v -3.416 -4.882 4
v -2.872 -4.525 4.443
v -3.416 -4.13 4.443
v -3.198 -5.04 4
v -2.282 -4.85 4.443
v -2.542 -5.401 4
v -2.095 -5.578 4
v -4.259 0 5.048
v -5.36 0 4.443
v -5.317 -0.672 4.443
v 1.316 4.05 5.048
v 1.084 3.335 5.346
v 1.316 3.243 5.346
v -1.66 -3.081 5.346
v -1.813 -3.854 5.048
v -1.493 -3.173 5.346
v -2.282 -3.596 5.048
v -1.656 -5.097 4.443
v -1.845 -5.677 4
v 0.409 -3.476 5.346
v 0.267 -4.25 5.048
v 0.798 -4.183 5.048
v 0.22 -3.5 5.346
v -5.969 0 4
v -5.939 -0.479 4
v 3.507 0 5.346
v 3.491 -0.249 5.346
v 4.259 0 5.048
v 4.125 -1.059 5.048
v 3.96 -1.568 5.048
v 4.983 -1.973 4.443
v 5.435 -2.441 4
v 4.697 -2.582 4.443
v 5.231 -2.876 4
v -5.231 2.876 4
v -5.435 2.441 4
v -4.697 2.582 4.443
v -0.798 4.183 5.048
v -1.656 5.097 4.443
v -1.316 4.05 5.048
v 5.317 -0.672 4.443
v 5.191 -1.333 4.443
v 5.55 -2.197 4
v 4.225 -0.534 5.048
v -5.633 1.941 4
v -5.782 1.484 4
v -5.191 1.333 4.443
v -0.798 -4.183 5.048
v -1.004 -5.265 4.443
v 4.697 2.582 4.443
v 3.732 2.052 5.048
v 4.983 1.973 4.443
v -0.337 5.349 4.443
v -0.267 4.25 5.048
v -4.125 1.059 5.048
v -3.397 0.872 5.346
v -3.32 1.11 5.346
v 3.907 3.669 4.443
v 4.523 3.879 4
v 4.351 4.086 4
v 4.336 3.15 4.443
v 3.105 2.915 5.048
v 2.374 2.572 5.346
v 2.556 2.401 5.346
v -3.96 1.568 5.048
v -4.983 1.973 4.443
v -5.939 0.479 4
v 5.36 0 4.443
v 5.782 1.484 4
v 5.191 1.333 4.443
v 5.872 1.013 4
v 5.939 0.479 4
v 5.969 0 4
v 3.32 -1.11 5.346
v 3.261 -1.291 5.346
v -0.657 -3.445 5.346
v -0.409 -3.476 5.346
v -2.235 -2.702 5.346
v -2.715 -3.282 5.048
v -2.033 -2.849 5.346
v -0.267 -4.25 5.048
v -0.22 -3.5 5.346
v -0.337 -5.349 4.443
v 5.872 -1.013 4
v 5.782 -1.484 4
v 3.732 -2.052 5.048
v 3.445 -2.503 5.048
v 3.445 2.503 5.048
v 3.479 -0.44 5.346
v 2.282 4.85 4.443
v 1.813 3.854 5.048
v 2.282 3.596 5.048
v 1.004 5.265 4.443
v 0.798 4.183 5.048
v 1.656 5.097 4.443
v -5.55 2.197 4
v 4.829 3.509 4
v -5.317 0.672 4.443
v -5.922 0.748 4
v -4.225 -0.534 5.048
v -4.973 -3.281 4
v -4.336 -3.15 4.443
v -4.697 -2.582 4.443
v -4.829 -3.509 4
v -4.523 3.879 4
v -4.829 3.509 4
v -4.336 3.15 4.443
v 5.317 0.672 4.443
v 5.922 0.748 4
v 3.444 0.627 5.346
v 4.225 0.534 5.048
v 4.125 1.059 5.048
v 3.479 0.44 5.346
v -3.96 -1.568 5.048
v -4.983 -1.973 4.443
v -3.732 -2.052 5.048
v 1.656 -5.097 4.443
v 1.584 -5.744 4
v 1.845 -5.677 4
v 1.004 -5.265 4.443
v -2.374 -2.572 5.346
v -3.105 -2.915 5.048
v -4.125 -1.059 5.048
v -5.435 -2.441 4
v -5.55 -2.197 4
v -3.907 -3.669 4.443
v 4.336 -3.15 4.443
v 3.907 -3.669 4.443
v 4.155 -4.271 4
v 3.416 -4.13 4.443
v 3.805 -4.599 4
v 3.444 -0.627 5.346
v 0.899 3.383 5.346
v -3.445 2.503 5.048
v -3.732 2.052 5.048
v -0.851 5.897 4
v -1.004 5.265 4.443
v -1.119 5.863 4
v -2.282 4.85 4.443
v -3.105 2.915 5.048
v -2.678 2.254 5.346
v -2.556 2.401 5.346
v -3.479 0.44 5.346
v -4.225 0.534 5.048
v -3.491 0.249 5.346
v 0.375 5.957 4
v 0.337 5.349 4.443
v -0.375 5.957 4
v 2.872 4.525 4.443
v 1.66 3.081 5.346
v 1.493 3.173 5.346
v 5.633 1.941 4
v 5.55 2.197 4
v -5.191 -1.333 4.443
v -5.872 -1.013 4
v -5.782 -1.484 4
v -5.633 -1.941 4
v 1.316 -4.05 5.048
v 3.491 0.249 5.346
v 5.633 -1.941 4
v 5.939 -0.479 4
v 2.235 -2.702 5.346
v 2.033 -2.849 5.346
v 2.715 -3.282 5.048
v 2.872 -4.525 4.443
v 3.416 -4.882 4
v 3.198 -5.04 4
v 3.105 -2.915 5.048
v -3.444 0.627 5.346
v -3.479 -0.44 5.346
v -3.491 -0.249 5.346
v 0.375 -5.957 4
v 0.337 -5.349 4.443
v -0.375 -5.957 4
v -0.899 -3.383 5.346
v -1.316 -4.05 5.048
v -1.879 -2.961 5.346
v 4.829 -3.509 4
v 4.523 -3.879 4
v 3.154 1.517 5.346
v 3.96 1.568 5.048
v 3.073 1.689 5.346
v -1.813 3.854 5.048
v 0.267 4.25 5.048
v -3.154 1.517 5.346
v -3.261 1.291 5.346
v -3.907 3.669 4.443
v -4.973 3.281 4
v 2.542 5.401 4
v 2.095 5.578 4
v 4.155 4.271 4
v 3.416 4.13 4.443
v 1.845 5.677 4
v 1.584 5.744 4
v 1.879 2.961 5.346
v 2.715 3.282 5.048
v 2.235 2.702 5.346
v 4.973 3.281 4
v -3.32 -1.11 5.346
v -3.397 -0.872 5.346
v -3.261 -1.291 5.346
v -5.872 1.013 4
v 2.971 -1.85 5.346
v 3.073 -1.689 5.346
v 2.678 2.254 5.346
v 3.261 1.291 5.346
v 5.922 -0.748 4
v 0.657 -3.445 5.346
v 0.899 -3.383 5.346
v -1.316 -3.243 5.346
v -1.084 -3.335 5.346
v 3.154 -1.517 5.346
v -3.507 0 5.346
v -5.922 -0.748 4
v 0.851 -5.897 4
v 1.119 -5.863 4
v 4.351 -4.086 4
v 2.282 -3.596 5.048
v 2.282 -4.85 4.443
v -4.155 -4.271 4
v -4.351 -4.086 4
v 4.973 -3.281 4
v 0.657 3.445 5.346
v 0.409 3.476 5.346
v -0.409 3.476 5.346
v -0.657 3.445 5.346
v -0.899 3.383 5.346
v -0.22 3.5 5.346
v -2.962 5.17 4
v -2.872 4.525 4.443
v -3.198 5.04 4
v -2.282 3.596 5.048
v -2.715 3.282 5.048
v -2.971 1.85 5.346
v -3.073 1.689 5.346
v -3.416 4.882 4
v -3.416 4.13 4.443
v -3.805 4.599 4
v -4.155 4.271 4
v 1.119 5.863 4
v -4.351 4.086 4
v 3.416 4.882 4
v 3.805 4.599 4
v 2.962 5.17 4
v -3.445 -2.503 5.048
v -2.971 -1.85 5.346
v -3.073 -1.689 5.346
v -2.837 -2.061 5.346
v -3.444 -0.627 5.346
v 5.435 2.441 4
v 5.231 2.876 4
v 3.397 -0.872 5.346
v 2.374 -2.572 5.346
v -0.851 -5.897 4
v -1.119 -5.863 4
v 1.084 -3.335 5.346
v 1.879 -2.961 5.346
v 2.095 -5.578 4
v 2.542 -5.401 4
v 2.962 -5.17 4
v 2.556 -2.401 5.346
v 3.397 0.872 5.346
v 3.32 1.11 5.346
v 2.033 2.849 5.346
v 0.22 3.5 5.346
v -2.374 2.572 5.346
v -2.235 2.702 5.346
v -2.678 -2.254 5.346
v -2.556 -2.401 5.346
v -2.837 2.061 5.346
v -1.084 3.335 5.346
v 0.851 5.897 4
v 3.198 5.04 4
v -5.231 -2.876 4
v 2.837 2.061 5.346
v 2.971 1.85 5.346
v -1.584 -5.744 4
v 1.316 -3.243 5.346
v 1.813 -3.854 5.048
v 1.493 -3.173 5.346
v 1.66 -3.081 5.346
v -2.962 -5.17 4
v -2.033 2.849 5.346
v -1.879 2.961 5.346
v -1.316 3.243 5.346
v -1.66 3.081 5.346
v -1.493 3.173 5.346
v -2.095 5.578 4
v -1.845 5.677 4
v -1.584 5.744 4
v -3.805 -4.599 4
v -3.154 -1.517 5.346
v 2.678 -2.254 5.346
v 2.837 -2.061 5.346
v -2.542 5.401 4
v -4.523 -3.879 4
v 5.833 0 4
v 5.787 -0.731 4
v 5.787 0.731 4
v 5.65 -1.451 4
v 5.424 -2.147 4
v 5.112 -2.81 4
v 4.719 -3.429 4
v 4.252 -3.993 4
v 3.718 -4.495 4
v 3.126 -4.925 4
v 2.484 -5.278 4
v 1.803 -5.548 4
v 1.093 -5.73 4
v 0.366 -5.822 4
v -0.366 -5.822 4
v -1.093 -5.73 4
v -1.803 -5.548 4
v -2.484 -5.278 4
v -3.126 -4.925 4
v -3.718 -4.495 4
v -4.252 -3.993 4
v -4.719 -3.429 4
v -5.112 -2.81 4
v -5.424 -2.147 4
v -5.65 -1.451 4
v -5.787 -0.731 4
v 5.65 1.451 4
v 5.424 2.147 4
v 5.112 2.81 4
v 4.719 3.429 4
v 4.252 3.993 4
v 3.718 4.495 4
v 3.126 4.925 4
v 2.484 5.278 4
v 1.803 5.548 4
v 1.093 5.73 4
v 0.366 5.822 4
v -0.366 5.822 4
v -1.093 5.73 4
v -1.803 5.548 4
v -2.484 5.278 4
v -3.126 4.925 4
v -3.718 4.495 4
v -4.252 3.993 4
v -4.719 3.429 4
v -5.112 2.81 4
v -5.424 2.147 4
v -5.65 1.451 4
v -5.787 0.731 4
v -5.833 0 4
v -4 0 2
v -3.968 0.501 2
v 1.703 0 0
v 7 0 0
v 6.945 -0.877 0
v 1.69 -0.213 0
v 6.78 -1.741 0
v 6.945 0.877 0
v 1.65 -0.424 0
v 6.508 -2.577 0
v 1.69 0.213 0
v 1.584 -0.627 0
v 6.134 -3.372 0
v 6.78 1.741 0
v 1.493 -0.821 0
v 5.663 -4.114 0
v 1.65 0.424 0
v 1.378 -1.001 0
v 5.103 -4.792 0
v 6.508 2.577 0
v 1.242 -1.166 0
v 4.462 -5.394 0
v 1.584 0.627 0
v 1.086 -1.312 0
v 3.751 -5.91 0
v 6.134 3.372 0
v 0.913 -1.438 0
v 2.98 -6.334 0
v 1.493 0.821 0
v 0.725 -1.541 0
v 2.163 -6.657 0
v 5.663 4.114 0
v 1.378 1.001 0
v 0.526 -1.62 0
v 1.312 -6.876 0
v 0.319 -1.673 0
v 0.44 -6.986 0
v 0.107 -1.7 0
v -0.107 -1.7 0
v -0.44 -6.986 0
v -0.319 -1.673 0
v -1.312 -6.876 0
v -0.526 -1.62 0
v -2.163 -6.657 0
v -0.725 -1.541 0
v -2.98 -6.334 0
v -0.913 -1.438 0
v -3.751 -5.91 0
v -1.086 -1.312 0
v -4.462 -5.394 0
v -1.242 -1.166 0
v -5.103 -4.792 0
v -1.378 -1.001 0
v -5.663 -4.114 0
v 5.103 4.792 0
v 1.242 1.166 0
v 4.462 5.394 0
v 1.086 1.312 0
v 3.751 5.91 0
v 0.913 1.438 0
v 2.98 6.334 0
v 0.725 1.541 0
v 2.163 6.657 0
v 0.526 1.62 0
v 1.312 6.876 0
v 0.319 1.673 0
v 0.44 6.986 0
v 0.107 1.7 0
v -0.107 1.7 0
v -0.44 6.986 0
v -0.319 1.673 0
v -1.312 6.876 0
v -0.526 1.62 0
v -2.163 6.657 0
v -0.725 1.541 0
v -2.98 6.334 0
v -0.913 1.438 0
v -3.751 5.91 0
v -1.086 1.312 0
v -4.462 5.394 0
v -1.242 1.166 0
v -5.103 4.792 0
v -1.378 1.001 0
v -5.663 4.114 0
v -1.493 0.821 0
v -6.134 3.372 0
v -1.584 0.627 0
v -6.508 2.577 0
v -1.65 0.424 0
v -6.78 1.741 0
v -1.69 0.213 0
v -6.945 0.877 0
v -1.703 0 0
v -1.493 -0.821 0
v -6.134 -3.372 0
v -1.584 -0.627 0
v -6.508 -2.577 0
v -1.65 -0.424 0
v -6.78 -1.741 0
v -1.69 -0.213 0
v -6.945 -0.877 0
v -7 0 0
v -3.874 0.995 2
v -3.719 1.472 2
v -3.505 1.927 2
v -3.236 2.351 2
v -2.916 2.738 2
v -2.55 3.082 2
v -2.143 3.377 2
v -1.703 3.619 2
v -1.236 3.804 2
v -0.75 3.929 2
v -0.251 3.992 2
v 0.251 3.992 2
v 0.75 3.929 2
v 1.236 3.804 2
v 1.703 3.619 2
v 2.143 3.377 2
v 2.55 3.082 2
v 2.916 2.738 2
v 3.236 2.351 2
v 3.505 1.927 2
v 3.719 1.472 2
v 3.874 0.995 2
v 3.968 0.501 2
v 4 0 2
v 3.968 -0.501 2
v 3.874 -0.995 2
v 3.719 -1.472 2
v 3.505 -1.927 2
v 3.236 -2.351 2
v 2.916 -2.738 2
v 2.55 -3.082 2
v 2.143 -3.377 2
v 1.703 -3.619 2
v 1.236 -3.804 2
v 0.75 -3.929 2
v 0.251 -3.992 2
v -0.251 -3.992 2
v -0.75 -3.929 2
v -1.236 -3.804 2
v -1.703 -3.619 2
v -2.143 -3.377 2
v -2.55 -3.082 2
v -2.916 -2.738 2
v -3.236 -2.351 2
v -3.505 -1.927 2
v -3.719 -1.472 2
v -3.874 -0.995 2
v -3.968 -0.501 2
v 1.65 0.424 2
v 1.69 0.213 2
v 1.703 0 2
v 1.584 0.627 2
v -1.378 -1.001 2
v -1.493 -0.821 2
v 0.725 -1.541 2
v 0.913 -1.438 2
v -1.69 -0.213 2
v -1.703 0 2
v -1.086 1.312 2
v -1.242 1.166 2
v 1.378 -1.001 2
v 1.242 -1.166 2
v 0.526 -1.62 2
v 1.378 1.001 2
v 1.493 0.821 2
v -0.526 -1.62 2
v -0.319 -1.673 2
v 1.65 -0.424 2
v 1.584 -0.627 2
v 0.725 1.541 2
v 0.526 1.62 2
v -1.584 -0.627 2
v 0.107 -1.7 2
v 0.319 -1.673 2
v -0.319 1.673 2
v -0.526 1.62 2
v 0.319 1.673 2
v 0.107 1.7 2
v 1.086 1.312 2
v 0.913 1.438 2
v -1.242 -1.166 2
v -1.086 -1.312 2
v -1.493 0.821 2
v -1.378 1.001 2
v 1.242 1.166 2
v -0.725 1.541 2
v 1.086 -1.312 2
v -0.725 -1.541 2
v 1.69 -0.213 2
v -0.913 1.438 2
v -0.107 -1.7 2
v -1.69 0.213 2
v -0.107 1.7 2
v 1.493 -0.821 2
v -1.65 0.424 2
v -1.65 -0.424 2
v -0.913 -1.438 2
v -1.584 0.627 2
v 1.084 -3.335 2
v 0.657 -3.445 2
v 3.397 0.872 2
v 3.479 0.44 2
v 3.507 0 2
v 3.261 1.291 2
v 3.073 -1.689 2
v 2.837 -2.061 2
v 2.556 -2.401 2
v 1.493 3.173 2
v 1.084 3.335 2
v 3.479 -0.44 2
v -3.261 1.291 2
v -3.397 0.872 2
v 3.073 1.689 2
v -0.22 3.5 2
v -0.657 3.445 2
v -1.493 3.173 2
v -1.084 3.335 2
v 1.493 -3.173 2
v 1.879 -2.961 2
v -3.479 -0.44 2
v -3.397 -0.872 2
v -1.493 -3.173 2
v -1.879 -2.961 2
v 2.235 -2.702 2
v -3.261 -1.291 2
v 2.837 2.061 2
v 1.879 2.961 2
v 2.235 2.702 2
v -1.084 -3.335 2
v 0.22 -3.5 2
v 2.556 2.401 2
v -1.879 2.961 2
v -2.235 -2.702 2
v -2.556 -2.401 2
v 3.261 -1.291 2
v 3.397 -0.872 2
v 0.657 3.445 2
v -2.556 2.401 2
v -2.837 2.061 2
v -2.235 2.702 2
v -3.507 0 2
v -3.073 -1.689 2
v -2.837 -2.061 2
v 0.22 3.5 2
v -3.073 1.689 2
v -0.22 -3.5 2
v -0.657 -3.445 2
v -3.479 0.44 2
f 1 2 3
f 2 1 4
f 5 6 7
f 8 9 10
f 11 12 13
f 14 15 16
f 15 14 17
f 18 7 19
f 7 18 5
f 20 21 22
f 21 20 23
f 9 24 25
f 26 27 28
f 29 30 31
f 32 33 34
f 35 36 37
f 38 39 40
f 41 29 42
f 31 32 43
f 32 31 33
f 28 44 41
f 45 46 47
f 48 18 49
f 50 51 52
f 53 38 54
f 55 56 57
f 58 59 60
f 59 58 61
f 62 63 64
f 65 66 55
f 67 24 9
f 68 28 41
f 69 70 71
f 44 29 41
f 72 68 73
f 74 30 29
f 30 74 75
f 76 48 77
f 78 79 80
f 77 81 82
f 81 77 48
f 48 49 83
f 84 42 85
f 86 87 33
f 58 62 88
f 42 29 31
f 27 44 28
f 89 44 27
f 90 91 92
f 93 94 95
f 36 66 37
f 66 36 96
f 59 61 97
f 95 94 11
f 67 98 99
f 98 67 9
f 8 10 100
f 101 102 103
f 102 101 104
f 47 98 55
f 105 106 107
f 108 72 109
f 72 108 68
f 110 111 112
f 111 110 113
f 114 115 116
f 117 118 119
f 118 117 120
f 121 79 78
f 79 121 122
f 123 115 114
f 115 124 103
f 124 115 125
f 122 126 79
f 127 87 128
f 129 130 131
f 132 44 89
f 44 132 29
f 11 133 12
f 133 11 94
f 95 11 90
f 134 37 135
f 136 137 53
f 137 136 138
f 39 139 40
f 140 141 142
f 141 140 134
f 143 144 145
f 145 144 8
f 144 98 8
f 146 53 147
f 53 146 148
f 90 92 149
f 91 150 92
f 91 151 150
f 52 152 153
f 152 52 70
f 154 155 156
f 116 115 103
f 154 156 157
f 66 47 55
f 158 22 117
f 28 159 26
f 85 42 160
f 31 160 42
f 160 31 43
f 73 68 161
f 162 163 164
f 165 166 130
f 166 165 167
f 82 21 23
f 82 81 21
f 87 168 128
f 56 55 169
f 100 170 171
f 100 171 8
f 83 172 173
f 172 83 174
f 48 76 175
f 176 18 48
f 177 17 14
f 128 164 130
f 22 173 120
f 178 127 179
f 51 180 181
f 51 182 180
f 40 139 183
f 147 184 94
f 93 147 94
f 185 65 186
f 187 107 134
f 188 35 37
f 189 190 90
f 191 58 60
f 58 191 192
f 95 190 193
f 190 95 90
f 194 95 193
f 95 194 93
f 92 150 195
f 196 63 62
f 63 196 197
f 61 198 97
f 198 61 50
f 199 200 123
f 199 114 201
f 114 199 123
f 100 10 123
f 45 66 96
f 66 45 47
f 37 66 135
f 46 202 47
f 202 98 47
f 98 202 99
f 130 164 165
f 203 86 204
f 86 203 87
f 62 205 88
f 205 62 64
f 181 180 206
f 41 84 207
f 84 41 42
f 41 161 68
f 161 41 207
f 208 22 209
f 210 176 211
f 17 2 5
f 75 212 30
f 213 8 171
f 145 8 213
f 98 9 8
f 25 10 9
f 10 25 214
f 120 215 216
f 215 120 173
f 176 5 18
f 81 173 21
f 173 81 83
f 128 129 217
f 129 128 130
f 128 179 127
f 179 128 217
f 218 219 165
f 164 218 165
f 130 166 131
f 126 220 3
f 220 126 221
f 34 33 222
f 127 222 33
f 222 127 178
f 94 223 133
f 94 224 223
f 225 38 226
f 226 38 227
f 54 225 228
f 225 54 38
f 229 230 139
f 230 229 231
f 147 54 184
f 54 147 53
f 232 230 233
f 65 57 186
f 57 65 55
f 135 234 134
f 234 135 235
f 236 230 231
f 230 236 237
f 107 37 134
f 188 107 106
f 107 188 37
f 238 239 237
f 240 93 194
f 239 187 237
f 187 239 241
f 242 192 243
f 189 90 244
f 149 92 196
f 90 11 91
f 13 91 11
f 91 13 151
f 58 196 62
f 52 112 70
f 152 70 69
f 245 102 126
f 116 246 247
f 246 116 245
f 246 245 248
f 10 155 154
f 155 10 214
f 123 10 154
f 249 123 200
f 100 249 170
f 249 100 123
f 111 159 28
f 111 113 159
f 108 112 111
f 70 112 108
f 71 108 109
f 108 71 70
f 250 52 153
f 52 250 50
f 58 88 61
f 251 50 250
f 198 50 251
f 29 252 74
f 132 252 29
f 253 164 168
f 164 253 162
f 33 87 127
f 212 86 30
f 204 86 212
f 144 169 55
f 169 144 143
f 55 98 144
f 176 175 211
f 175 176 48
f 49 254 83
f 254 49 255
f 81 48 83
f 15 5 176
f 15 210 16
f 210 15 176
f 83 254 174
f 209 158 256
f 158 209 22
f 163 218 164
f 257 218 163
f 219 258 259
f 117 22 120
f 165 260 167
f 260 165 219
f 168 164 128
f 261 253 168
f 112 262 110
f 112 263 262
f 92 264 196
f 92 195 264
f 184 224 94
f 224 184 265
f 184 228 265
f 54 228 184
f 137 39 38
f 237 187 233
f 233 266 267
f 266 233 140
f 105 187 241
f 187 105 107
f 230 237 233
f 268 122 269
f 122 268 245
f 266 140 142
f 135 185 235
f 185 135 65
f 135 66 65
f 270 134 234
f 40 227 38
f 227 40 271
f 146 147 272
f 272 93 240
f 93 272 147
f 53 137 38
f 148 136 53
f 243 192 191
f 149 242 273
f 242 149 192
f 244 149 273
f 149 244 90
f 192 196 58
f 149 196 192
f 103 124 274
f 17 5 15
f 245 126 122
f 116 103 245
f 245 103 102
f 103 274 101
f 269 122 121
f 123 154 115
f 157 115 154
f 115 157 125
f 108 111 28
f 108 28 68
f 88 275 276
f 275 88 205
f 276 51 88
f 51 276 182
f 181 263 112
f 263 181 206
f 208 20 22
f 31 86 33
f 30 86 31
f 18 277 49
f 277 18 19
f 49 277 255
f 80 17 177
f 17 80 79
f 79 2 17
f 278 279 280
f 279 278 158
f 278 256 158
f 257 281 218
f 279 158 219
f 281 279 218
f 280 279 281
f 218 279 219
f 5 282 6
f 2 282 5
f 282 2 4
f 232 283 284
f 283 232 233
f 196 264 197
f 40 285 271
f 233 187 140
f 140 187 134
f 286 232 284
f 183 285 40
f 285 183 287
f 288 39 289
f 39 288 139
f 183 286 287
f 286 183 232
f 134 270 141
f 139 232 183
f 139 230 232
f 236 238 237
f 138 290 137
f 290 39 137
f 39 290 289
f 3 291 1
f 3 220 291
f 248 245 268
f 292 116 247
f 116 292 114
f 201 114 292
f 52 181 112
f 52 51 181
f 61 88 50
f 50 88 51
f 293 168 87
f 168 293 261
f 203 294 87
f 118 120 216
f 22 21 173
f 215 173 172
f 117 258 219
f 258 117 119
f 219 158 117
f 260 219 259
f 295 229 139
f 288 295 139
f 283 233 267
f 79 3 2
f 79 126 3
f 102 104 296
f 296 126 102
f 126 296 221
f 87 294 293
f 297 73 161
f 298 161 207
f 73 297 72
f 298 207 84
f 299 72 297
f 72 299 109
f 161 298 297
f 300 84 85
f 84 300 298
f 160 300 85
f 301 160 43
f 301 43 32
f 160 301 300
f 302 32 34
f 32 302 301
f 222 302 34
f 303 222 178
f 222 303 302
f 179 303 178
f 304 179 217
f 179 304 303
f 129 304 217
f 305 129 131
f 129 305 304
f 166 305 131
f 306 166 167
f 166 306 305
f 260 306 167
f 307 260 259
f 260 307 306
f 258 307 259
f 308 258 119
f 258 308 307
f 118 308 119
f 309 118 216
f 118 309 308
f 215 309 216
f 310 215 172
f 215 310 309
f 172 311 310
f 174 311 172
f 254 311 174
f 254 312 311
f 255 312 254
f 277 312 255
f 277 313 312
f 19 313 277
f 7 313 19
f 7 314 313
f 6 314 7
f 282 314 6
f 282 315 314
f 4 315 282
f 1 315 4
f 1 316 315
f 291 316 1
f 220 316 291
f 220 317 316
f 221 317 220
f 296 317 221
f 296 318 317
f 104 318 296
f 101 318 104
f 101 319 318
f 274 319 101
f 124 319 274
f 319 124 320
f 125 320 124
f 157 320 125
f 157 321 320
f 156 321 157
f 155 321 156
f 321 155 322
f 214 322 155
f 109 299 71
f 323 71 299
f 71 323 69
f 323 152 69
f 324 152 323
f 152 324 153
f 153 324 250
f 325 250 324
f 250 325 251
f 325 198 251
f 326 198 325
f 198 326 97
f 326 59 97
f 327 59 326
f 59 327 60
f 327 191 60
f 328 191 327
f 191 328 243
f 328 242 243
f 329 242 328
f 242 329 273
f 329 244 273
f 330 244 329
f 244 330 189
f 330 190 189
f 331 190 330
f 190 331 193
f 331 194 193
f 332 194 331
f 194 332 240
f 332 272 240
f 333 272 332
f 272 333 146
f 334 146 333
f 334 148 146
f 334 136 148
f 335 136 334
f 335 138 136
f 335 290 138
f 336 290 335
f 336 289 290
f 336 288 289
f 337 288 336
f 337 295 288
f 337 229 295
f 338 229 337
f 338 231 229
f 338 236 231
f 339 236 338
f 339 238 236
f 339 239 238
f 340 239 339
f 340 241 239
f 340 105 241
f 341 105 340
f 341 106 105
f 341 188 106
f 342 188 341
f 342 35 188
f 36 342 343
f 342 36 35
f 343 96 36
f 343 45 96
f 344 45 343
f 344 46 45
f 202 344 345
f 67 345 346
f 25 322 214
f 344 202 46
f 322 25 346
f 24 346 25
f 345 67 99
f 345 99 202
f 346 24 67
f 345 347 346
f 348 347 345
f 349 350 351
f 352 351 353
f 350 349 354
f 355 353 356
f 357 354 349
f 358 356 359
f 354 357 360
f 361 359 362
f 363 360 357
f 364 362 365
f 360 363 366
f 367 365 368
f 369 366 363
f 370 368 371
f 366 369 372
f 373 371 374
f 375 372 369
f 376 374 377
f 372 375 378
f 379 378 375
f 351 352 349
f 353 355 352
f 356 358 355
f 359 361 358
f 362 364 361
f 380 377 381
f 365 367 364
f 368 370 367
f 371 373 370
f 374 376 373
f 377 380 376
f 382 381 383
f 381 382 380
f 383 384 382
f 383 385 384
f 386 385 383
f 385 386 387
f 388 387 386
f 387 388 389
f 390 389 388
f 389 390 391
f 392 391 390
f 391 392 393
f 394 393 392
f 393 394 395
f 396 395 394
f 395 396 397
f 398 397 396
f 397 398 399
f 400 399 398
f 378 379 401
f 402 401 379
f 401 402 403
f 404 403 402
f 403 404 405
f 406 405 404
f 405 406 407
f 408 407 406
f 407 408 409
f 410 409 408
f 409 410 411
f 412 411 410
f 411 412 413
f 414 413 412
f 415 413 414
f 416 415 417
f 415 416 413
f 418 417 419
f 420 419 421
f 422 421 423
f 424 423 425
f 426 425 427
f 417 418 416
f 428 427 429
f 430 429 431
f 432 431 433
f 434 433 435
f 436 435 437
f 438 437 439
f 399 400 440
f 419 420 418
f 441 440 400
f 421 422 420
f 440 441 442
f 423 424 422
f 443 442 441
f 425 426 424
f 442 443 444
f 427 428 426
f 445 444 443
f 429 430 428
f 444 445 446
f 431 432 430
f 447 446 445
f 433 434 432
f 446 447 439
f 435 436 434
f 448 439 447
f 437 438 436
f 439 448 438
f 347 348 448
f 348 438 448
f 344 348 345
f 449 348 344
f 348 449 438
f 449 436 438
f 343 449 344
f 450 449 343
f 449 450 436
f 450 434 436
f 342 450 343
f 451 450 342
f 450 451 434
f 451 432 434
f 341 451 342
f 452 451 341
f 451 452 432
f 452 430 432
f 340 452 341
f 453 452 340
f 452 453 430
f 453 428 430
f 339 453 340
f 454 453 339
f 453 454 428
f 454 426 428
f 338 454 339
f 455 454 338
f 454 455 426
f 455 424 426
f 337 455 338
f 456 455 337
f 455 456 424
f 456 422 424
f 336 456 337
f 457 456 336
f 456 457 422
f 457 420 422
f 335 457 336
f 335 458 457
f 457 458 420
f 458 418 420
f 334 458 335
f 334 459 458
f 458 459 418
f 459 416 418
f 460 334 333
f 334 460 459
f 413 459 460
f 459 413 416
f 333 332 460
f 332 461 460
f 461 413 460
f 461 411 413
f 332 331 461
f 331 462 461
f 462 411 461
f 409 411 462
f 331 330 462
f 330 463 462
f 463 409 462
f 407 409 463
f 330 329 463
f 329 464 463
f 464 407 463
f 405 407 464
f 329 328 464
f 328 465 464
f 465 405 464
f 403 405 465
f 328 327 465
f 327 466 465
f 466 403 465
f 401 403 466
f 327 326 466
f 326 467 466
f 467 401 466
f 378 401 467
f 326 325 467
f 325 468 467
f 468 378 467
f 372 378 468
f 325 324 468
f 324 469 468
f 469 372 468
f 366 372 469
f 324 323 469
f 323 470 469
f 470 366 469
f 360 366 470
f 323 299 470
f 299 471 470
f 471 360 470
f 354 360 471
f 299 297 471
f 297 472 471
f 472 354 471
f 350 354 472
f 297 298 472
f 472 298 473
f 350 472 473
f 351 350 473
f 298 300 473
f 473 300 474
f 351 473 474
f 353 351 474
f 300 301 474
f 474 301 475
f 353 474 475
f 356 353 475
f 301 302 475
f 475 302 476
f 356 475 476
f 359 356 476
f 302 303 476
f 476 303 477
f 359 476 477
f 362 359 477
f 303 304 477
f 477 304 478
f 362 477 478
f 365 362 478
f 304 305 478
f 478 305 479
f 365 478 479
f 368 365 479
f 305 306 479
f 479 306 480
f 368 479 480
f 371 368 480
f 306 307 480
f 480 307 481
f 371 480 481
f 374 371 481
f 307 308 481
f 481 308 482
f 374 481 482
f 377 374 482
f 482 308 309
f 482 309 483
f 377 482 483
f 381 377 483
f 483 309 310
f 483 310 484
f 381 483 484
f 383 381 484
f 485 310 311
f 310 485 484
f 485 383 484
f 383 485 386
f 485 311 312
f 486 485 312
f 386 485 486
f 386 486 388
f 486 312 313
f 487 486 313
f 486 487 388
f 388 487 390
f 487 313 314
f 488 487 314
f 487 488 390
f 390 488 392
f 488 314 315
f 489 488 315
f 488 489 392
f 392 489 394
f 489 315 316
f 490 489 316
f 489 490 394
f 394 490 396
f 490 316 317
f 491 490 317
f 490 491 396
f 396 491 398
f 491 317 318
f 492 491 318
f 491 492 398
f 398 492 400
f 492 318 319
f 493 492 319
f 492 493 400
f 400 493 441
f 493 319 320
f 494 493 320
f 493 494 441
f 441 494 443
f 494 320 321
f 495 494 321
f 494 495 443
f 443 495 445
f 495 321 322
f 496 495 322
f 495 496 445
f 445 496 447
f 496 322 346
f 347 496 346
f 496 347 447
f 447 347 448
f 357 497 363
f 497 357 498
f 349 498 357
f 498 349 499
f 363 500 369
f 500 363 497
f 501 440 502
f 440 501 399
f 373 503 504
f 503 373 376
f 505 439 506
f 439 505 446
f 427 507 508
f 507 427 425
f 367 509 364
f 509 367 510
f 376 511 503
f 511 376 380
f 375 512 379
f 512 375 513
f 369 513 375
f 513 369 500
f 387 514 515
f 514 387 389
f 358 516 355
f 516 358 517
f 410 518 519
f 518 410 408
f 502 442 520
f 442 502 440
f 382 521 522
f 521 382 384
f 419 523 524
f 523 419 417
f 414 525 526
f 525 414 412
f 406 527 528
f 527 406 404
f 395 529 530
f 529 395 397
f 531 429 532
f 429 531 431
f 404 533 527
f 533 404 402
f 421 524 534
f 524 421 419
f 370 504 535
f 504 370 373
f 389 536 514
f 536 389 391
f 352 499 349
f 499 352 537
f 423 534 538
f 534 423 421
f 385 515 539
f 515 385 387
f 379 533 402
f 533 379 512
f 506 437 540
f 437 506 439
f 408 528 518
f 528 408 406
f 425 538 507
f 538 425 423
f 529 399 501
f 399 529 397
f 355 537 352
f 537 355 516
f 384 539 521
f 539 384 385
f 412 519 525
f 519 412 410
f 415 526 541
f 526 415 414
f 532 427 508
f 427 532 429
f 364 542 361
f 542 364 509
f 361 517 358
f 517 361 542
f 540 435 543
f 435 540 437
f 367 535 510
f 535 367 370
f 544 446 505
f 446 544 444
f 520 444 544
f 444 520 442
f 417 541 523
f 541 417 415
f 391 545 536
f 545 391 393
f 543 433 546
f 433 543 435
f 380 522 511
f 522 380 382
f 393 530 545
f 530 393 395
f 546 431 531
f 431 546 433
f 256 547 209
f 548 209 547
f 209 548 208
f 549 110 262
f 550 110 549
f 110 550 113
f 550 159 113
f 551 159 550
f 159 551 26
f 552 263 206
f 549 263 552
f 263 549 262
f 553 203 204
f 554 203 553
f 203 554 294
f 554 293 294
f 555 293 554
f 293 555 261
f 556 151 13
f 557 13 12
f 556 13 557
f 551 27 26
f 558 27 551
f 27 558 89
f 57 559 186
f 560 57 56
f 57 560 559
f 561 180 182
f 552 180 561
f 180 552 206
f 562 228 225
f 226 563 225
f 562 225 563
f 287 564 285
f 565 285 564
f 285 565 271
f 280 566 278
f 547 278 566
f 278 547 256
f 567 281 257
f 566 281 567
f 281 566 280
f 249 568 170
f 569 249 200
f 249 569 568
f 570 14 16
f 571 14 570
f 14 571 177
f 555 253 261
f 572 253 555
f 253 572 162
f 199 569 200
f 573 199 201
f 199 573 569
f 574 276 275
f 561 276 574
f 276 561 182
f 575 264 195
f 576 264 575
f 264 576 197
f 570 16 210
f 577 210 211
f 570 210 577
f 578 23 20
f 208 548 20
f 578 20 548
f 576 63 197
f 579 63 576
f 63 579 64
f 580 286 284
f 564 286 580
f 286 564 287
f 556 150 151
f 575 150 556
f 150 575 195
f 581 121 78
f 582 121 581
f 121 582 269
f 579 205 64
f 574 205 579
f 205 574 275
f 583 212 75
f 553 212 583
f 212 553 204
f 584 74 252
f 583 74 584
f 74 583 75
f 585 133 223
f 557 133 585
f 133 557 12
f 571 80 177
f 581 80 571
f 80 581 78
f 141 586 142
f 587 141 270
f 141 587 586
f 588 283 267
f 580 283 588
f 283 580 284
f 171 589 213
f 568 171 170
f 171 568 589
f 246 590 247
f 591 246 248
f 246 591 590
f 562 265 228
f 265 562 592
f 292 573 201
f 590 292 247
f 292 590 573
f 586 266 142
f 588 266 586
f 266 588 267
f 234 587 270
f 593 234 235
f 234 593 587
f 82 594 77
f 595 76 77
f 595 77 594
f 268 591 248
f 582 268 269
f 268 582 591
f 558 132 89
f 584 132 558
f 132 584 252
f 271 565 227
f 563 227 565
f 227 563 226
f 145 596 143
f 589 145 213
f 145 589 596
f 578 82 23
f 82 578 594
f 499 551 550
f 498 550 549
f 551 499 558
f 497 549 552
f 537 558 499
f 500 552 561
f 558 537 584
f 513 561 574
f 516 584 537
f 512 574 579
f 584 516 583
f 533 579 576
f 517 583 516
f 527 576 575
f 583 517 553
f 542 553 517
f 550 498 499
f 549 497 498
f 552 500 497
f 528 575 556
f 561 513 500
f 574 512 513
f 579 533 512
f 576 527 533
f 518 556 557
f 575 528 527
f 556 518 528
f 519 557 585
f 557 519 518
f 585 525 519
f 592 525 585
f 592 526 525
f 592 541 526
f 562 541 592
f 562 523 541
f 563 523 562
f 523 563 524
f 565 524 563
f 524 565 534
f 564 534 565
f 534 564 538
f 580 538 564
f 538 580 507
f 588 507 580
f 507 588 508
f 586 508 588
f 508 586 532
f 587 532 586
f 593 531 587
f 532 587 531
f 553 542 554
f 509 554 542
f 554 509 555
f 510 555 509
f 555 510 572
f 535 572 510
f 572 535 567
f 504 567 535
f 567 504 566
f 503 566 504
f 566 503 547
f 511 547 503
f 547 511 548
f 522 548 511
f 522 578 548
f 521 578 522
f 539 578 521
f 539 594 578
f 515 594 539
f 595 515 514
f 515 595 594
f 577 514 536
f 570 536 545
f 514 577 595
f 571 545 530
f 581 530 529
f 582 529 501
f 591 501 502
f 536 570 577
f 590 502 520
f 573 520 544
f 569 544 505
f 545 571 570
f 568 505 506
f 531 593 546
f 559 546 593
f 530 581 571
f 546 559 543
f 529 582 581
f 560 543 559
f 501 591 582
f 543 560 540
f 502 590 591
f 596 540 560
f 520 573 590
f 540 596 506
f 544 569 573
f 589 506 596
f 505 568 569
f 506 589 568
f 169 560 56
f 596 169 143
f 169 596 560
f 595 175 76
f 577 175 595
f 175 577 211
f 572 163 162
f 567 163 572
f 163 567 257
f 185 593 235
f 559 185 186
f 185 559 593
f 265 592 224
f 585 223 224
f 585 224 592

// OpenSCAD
// file: utils/cylinder-outer.scad
module cylinder_outer(height,radius,fn){
  fudge = 1/cos(180/fn);
  cylinder(h=height,r=radius*fudge,$fn=fn);
}
// main file
use <./utils/cylinder-outer.scad>

rivetDiameter= 3.4;
clearingDiameter= 7;
lockDiameter= 14;
lockShortDiameter = 8;
lockHeight= 4;

module roundedFace (thickness, diameter) {
  radius = diameter / 2;
  echo("radius: " , radius);
  sphereRadius = radius * radius / (2*thickness) + thickness*thickness;
  echo("sphere radius: " , sphereRadius);
  difference() {
    translate([0,0, - sphereRadius + thickness])
    sphere(r = sphereRadius, $fn = 50);
translate([-sphereRadius, -sphereRadius, - 2 * sphereRadius ])
    cube(sphereRadius * 2);
  }
}

module stringLock() {
  difference() {
  union() {
    translate([0,0,lockHeight ])
    #roundedFace(2, lockDiameter * 0.7);
    rotate_extrude(convexity = 10, $fn = 50)
    polygon(points = [[0,0], [lockDiameter/2, 0], [lockShortDiameter/2, lockHeight / 2], [lockDiameter/2.4, lockHeight], [0, lockHeight]]);
  }
  translate([0,0,-lockHeight])
  cylinder_outer(lockHeight * 4, rivetDiameter / 2, fn = 50);

  translate([0,0, 2])
  #cylinder_outer(lockHeight * 2, (clearingDiameter / 2), fn= 50);
  }
}



stringLock();
